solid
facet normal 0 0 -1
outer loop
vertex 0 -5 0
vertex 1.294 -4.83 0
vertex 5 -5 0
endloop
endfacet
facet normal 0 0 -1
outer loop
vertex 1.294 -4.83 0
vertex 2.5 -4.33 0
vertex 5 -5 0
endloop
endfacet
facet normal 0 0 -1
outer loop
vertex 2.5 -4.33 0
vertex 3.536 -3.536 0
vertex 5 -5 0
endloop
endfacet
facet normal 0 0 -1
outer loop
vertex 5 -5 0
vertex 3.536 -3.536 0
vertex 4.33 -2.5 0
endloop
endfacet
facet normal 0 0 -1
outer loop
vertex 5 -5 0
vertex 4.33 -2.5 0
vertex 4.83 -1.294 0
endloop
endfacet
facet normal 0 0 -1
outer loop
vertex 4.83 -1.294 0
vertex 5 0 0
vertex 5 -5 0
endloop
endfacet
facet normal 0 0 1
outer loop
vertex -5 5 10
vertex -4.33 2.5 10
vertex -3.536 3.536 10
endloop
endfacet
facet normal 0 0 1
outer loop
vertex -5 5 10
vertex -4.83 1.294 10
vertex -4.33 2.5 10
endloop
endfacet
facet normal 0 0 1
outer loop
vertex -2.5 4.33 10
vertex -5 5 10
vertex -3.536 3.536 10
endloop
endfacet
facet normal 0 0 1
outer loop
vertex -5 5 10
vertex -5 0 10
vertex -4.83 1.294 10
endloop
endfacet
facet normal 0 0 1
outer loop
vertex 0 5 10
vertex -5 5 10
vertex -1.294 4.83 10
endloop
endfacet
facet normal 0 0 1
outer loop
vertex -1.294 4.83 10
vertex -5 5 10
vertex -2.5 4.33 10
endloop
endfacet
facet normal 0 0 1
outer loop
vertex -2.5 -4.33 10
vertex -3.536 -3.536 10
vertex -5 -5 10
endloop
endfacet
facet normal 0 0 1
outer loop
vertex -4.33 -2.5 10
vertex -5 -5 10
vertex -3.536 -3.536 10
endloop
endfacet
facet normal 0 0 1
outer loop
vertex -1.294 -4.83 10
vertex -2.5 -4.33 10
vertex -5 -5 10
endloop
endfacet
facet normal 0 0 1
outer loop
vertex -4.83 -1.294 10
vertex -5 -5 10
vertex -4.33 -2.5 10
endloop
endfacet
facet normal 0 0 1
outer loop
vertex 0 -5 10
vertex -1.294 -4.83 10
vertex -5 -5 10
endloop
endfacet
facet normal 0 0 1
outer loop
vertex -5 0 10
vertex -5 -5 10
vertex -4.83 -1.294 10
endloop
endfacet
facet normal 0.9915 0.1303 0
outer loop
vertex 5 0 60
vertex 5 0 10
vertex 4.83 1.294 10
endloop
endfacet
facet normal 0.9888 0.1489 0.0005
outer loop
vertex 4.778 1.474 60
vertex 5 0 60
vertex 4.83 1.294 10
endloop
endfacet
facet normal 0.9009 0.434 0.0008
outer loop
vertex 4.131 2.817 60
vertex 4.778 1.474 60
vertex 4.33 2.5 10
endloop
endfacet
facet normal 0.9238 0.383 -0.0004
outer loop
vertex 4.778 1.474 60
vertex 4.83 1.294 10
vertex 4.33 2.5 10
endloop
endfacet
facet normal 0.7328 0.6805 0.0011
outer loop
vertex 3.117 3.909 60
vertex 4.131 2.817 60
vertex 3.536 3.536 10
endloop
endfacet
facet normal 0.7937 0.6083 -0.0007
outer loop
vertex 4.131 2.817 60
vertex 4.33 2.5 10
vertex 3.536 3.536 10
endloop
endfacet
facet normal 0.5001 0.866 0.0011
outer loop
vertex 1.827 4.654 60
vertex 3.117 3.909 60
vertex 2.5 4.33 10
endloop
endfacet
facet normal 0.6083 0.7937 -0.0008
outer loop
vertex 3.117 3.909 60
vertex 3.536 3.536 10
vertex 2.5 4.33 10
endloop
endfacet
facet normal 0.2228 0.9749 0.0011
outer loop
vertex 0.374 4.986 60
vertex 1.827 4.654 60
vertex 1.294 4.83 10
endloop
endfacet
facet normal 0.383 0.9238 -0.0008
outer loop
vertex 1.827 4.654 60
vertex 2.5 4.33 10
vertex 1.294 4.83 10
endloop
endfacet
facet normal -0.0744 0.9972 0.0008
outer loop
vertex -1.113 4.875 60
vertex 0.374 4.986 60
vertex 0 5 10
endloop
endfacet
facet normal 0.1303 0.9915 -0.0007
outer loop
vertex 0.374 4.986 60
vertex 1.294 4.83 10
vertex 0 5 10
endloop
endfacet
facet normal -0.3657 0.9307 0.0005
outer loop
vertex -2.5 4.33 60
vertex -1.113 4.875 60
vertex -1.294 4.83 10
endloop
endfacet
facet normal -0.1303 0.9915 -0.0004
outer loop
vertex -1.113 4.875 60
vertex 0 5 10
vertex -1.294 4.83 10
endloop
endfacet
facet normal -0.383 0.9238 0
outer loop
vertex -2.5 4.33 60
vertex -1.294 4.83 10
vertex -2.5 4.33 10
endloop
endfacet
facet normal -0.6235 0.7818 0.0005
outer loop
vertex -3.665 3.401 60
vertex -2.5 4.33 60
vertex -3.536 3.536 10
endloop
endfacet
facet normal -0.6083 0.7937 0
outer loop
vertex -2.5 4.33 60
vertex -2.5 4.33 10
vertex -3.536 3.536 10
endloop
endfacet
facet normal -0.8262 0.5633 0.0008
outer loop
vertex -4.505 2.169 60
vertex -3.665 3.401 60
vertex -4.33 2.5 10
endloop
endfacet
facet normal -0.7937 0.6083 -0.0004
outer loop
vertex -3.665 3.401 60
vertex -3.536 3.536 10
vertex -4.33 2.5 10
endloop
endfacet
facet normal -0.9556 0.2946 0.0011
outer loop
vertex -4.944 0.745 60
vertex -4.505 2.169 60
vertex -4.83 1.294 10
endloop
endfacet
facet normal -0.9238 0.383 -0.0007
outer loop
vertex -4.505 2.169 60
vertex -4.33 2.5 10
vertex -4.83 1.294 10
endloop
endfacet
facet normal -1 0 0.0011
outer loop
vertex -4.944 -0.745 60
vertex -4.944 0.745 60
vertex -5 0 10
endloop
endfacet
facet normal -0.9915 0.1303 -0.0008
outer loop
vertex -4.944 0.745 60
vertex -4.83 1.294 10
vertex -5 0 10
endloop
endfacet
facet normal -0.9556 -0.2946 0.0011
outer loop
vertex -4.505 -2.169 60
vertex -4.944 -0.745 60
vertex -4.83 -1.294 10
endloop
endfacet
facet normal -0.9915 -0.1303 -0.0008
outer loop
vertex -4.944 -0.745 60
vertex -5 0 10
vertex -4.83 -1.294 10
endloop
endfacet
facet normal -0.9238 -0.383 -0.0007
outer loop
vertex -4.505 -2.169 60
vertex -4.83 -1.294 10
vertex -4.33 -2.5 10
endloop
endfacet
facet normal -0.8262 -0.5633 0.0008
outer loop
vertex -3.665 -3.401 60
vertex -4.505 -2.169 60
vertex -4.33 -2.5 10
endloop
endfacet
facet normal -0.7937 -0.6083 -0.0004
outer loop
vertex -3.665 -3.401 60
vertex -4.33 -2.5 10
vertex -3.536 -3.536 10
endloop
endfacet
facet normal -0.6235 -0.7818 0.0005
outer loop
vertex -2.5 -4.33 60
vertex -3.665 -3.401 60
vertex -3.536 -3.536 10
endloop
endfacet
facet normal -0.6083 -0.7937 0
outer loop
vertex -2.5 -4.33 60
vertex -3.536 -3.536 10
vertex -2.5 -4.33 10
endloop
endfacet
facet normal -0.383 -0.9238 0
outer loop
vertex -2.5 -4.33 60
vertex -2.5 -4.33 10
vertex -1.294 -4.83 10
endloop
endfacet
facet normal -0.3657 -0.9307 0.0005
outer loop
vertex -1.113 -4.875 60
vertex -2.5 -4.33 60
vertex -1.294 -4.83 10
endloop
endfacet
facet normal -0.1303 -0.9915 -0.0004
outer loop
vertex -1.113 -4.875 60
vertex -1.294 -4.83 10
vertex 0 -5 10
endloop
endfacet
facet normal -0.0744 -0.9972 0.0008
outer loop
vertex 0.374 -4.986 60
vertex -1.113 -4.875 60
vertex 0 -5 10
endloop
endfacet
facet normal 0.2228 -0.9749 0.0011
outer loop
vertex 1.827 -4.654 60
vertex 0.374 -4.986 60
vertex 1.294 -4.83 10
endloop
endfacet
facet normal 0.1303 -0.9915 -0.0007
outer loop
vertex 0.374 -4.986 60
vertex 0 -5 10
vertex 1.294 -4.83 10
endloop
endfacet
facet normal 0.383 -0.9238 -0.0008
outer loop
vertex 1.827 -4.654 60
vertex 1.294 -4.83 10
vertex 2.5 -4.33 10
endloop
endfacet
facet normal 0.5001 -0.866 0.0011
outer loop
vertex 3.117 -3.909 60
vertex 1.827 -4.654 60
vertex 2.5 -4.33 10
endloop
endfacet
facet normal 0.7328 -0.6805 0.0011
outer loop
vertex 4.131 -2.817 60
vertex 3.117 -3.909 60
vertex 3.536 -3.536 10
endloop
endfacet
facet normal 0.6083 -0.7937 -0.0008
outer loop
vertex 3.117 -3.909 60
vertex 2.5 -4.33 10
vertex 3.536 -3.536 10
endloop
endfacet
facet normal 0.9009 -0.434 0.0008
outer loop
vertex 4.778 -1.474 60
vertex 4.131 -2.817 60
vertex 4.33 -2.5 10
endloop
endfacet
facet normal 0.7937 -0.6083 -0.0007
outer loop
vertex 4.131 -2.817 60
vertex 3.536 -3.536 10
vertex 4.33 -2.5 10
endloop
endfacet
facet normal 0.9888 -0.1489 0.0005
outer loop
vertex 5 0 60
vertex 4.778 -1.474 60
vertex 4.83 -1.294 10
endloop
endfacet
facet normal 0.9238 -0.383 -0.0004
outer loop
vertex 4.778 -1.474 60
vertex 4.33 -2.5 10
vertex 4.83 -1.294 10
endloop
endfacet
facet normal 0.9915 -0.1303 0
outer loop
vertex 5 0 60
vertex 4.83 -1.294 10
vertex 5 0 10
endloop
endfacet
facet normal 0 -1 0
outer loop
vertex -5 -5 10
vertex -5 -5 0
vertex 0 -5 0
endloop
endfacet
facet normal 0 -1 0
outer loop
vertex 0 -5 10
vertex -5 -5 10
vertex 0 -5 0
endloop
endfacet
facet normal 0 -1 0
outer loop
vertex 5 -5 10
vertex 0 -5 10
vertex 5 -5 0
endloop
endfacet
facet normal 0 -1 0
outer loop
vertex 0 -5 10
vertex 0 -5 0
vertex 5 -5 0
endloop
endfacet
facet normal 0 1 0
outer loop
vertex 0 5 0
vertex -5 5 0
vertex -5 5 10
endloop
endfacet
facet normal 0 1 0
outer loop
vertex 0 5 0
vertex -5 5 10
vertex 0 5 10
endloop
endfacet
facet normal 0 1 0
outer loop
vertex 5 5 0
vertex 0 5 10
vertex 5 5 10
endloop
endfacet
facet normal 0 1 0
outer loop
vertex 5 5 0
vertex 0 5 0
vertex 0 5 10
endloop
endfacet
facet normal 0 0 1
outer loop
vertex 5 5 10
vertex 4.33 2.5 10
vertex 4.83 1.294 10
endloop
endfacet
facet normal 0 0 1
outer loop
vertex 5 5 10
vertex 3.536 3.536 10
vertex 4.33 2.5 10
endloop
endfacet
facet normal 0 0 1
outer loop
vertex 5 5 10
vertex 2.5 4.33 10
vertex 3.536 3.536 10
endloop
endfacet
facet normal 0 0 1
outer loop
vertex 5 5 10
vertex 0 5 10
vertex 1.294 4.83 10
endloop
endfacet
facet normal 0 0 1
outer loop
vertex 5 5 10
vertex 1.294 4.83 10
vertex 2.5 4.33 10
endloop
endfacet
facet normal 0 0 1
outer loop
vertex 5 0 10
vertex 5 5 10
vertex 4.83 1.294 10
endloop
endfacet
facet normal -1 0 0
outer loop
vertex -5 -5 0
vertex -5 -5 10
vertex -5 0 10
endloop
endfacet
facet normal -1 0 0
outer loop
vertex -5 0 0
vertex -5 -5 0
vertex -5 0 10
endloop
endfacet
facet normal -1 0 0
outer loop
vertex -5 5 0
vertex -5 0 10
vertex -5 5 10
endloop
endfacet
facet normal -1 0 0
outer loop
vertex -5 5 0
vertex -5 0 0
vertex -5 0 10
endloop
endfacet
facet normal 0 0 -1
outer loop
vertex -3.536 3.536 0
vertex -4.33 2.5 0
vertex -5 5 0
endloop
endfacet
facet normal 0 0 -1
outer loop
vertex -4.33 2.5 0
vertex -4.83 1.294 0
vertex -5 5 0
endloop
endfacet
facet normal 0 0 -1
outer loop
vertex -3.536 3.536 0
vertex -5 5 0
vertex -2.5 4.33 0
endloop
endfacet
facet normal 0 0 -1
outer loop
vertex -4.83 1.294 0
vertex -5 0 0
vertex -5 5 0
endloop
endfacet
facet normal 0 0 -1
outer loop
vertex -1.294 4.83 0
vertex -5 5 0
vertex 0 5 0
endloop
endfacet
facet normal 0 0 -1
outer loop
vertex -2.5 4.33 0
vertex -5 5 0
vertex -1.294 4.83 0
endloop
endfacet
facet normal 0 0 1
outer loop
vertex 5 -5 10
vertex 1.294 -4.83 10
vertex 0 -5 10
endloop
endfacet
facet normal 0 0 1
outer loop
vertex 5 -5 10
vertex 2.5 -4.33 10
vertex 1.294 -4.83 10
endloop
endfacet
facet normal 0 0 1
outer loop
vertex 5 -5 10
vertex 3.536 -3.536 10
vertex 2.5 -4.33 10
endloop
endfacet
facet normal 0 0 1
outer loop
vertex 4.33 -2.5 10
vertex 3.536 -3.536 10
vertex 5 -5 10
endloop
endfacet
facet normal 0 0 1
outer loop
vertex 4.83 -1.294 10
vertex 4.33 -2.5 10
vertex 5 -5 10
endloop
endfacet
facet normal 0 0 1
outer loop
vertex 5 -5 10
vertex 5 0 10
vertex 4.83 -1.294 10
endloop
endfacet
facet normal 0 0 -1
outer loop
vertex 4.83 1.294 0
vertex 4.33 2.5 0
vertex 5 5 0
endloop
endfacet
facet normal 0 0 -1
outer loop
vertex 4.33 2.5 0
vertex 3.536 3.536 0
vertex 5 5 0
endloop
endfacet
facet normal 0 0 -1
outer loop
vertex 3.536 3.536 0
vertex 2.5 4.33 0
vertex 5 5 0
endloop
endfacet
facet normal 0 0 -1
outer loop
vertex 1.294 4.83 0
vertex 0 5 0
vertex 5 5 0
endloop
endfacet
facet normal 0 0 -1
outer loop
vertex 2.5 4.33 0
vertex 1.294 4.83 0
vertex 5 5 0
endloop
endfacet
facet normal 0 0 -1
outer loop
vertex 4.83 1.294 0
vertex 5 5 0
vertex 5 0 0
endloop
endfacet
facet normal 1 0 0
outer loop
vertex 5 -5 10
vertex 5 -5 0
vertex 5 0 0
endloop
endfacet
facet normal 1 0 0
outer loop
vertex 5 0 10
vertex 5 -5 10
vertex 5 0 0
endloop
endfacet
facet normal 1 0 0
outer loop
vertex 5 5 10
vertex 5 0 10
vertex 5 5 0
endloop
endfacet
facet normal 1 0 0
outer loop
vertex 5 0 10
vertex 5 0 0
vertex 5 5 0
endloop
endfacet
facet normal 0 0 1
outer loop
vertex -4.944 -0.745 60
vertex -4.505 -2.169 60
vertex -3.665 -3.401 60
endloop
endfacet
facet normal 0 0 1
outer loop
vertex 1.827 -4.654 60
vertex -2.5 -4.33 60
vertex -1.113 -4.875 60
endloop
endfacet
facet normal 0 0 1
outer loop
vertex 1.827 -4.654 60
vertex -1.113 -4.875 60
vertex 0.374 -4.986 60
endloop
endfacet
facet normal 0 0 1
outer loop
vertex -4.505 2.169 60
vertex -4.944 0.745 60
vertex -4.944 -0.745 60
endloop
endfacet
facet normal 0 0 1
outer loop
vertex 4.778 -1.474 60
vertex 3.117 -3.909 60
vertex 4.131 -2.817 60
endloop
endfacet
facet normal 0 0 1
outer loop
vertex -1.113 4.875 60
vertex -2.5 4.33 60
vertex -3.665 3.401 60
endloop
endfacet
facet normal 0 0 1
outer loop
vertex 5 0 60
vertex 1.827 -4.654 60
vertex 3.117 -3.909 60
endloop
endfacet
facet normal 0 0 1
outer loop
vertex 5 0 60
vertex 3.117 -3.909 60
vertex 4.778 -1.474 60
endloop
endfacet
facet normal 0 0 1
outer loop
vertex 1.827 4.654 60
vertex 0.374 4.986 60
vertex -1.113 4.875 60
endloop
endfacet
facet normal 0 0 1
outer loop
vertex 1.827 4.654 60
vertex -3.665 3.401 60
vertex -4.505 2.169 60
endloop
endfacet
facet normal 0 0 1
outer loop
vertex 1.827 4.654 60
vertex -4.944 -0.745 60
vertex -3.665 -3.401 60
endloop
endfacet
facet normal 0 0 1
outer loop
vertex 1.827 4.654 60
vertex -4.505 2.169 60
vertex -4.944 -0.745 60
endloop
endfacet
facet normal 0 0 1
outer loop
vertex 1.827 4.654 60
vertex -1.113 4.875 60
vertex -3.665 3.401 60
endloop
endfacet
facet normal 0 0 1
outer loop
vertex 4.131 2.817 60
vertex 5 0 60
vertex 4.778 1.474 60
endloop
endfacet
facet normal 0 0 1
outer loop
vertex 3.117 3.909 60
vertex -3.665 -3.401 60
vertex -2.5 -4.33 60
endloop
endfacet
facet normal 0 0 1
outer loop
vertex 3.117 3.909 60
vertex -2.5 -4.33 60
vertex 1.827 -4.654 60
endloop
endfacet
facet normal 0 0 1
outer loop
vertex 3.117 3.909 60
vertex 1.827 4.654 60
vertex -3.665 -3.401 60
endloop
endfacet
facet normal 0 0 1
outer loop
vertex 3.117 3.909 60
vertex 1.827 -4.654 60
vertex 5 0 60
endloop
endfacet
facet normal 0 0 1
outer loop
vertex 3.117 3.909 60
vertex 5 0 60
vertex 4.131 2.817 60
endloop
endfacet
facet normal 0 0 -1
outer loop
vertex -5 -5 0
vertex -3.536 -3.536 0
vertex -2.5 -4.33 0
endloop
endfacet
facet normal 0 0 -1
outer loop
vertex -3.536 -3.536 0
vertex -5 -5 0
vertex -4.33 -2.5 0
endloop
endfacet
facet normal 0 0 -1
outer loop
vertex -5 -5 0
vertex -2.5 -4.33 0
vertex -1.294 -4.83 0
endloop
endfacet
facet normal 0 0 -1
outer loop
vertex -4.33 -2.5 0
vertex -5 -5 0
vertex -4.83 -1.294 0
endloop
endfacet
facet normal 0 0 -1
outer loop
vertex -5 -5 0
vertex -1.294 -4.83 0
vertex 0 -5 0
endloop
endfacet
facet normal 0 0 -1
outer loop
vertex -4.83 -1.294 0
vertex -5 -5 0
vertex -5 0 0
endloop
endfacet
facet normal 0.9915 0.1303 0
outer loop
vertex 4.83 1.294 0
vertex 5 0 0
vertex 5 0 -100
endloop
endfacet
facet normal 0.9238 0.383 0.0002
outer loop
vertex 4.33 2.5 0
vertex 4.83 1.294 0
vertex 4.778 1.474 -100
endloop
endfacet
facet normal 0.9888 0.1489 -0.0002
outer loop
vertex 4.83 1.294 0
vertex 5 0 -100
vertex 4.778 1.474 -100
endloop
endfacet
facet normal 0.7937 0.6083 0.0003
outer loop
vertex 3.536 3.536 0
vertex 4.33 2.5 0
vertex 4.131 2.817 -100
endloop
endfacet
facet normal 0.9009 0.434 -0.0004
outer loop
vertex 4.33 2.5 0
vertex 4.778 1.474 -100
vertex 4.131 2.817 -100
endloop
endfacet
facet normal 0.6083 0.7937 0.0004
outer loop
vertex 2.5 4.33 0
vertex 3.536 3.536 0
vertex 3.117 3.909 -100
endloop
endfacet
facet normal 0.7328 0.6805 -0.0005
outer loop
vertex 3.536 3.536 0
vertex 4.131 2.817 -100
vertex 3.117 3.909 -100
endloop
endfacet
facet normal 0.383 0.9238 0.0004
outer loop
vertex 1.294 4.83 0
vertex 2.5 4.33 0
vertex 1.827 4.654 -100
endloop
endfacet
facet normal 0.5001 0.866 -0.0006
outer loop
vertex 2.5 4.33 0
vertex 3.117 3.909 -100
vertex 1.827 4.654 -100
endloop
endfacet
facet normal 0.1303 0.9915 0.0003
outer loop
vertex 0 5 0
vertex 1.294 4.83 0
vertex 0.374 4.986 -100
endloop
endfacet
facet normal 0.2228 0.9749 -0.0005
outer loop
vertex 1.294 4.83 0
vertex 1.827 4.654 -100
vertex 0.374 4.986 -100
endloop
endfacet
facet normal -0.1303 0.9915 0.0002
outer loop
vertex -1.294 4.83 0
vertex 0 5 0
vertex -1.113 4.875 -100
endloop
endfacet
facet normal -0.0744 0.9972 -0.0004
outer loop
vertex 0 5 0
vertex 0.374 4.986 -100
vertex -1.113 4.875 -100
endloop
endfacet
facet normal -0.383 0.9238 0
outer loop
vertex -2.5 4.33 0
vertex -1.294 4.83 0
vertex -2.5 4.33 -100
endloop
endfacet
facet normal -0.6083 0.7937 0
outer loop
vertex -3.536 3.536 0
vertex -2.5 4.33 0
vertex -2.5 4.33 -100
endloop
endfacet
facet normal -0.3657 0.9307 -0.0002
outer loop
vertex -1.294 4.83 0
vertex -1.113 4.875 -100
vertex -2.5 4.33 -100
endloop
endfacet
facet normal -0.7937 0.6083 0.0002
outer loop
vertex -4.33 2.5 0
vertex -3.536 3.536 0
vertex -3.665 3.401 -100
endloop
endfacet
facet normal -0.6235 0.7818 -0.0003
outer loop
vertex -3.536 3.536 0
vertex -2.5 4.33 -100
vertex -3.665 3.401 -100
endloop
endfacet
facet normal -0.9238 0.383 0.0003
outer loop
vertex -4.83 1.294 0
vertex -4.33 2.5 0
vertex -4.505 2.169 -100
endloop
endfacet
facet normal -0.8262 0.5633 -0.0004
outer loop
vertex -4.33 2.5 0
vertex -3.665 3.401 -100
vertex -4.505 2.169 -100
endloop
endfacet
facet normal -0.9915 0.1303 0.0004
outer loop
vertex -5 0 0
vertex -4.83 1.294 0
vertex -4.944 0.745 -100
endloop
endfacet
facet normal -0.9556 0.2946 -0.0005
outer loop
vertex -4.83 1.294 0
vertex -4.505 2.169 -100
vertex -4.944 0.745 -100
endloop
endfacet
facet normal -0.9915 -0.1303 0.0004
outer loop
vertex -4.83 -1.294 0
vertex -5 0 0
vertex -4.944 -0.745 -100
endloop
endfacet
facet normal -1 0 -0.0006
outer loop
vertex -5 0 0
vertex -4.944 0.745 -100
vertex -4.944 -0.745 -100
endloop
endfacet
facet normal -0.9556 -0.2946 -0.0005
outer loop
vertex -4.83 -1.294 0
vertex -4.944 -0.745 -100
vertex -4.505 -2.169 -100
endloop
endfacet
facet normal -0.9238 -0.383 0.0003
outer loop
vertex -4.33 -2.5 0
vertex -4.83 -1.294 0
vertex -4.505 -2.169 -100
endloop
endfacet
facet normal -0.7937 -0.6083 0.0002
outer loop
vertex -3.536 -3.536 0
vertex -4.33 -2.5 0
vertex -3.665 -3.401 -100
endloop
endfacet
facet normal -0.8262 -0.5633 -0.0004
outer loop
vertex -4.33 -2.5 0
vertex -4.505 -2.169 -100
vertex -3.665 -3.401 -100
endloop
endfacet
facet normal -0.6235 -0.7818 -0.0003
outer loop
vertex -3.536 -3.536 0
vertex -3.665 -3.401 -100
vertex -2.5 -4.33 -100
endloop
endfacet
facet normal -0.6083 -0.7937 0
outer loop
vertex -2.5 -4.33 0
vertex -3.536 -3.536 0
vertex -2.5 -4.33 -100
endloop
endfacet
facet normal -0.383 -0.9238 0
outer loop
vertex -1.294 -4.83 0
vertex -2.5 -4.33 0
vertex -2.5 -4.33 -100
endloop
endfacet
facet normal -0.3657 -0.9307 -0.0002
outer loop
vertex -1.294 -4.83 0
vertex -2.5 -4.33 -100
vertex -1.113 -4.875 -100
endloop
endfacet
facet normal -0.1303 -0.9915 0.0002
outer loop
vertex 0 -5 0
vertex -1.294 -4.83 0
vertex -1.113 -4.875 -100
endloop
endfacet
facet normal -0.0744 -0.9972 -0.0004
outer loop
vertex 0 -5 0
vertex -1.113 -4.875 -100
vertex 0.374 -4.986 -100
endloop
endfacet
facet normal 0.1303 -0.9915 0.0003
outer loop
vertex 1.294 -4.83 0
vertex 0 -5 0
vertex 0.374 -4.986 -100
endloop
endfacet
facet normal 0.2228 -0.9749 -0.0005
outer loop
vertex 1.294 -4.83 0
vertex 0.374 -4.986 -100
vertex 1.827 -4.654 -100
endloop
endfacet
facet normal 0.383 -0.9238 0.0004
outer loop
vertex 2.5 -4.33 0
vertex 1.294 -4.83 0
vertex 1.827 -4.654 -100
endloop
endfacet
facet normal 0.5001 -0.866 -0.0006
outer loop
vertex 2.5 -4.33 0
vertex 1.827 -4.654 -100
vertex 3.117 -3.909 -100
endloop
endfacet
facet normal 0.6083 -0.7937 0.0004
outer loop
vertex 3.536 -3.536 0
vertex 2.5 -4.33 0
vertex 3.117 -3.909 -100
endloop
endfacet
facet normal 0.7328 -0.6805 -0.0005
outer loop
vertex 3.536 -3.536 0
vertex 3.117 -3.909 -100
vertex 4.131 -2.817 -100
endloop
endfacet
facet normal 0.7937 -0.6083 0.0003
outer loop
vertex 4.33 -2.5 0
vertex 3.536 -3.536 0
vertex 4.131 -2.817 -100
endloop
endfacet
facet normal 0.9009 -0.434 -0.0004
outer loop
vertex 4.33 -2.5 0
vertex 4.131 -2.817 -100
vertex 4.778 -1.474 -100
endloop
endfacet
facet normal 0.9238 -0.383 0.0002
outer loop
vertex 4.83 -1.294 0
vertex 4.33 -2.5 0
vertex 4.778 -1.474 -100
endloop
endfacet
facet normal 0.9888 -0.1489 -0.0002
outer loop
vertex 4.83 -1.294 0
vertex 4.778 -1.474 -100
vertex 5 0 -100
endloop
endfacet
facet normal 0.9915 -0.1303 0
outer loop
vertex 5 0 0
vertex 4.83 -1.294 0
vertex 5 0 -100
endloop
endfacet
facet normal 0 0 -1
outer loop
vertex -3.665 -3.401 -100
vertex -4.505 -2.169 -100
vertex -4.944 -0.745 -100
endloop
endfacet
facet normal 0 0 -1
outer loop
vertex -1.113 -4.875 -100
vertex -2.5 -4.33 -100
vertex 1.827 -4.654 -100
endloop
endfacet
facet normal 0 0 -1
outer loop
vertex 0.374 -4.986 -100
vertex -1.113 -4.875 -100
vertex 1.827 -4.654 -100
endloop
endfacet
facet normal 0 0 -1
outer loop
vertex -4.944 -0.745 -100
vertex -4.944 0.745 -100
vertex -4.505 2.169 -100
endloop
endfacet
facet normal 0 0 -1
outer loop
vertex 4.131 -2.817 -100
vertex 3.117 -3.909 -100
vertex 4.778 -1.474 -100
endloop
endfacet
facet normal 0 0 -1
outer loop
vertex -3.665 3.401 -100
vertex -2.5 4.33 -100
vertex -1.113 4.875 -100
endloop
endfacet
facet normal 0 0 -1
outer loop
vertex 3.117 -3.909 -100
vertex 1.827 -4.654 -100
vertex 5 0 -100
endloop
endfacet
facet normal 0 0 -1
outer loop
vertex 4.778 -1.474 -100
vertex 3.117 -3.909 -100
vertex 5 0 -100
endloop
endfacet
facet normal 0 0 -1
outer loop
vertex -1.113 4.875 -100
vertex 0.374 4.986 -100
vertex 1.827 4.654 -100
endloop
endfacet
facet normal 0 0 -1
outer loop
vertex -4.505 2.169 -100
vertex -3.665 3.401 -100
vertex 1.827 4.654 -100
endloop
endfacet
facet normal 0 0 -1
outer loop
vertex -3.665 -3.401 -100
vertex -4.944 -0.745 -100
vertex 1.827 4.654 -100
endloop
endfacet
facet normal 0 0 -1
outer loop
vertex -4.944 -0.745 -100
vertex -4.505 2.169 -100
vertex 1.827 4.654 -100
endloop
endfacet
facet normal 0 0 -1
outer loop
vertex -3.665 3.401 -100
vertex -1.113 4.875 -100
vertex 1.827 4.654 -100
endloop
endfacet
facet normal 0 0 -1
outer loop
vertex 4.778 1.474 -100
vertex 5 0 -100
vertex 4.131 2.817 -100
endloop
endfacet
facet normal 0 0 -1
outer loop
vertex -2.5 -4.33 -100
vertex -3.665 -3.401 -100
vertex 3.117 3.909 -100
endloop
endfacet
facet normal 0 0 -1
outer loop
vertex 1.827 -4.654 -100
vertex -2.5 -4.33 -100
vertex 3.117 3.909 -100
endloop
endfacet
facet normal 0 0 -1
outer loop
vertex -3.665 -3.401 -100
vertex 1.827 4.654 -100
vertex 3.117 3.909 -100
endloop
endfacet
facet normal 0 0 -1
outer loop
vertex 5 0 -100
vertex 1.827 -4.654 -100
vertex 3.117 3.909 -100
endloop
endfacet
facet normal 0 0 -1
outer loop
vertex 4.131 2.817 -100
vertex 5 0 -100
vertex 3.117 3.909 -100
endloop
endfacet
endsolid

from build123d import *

# Parameters (mm, degrees)
CYLINDER_R        = 5
CYLINDER_DEPTH    = 50
BOX_W             = 10
BOX_H             = 10
BOX_DEPTH         = 10
CYLINDER001_R     = 5
CYLINDER001_DEPTH = 100


with BuildPart() as cylinder:
    # Cylinder → Cylinder (new body)
    with BuildSketch(Plane(origin=(5, 5, 10), x_dir=(1, 0, 0), z_dir=(0, 0, 1))):
        Circle(CYLINDER_R)
    extrude(amount=CYLINDER_DEPTH)


with BuildPart() as box:
    # Box → Box (new body)
    with BuildSketch(Plane.XY):
        with Locations((5, 5)):
            Rectangle(BOX_W, BOX_H)
    extrude(amount=BOX_DEPTH)


with BuildPart() as fusion:
    # Cylinder001 → Cylinder001 (new body)
    with BuildSketch(Plane(origin=(5, 5, -100), x_dir=(1, 0, 0), z_dir=(0, 0, 1))):
        Circle(CYLINDER001_R)
    extrude(amount=CYLINDER001_DEPTH)

    # Fusion: union Cylinder, Box
    add(cylinder.part)
    add(box.part)


with BuildPart() as fusion_1:
    # Fusion placement: moved
    add(fusion.part.moved(Location((-5, -5, 0))))


solid = fusion_1.part
